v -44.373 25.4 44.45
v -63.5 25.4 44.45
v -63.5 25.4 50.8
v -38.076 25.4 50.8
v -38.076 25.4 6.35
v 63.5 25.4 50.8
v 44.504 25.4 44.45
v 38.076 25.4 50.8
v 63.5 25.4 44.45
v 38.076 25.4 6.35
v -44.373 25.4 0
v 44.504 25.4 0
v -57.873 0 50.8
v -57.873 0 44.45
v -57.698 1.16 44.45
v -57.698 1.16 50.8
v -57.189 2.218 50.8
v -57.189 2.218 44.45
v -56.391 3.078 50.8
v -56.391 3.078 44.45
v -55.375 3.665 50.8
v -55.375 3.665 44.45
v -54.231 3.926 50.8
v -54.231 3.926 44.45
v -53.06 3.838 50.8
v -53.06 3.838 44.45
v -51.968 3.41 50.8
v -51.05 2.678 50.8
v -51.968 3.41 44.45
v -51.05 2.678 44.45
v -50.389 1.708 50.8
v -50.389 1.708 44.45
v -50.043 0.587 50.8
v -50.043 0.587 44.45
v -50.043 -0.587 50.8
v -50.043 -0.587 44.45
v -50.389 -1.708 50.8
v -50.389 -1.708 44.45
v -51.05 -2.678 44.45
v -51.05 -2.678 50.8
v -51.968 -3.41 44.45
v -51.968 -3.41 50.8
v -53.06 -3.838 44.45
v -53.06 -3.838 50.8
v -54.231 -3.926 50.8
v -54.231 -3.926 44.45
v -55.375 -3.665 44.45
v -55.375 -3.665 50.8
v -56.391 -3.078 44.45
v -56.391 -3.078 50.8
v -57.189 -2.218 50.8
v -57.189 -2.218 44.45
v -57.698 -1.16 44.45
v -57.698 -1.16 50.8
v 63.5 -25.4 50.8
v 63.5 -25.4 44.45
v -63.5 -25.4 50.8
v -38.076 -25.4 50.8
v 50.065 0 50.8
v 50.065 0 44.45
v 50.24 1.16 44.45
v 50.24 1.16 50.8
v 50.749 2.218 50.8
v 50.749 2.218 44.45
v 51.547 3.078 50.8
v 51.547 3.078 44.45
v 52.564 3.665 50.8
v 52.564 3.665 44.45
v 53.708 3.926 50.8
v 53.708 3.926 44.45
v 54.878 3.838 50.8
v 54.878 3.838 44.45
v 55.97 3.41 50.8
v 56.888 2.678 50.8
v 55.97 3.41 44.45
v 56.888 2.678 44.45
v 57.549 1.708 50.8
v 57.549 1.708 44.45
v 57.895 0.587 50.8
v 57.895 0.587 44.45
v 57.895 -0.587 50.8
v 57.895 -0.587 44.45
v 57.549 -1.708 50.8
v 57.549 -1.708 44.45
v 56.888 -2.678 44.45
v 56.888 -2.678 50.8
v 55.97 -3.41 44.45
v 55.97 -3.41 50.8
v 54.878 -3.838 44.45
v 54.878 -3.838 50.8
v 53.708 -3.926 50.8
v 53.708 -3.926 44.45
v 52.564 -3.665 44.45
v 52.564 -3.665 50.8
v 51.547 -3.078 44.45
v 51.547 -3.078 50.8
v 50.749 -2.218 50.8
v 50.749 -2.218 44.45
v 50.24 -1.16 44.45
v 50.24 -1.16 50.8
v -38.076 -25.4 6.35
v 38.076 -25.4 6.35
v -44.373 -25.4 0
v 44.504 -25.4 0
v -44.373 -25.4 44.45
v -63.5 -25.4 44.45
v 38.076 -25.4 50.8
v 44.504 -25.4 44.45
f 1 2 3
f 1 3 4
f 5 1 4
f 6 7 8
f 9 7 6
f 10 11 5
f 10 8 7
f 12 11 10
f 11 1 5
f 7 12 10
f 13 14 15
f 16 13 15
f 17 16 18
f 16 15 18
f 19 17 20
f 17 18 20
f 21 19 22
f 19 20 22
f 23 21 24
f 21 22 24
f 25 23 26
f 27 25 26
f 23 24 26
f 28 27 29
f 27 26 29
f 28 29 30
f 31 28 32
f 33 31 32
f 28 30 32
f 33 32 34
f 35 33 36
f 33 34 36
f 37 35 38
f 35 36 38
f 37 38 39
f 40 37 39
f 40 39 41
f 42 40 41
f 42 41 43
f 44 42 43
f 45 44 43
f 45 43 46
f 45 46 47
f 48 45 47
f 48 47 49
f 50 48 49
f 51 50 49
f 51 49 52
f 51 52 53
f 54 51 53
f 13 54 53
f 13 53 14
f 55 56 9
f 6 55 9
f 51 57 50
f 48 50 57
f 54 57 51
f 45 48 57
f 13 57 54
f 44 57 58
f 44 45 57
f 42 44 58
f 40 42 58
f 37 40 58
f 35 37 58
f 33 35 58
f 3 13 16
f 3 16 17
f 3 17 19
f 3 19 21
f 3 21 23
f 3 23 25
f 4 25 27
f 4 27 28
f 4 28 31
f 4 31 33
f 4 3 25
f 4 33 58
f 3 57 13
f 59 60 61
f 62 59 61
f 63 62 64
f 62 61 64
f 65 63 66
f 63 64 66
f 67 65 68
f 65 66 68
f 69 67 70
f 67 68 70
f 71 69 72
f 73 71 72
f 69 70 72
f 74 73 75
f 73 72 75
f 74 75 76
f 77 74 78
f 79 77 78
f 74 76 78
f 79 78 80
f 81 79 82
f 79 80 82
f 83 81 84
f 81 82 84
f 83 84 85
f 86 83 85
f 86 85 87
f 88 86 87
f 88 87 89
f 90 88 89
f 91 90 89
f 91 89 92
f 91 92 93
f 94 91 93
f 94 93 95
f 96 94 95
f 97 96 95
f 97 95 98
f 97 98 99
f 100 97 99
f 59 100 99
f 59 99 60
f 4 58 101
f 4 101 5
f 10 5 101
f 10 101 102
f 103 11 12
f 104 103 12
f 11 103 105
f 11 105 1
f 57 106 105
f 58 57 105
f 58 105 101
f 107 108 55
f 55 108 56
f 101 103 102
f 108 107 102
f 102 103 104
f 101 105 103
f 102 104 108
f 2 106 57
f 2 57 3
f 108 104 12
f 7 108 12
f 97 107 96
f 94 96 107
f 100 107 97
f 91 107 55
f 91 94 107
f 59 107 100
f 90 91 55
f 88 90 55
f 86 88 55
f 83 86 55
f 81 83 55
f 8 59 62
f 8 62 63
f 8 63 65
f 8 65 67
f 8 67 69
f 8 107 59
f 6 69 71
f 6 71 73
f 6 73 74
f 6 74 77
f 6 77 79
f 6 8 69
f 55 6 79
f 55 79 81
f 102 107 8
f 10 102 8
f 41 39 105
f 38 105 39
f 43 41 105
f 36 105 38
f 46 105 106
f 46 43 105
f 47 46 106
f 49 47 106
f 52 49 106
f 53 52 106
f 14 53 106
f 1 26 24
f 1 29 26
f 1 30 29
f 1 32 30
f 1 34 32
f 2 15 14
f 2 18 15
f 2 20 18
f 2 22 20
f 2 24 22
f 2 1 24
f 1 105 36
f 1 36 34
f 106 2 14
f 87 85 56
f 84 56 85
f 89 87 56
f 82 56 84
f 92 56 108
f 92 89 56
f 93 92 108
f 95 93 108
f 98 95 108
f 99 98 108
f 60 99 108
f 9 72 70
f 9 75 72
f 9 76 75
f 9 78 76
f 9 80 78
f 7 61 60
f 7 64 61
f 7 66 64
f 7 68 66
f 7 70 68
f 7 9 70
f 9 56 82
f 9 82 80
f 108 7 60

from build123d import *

# Parameters (mm, degrees)
SKETCH1_W           = 127
SKETCH1_H           = 50.8
BOSS_EXTRUDE1_DEPTH = 50.8
SKETCH2_W           = 18.996127276
SKETCH2_H           = 50.8
SKETCH2_W_2         = 19.127407137
CUT_EXTRUDE1_DEPTH  = 44.45
SKETCH3_W           = 76.151334044
SKETCH3_H           = 50.8
CUT_EXTRUDE2_DEPTH  = 44.45
SKETCH5_R           = 3.937
CUT_EXTRUDE4_DEPTH  = 44.45
SKETCH6_R           = 3.937
CUT_EXTRUDE5_DEPTH  = 44.45


with BuildPart() as part:
    # Sketch1 → Boss-Extrude1 (new body)
    with BuildSketch(Plane.XY):
        Rectangle(SKETCH1_W, SKETCH1_H)
    extrude(amount=BOSS_EXTRUDE1_DEPTH)

    # Sketch2 → Cut-Extrude1 (cut)
    with BuildSketch(Plane(origin=(0, 0, 0), x_dir=(-1, 0, 0), z_dir=(0, 0, -1))):
        with Locations((-54.001936362, 0)):
            Rectangle(SKETCH2_W, SKETCH2_H)
        with Locations((53.936296432, 0)):
            Rectangle(SKETCH2_W_2, SKETCH2_H)
    extrude(amount=-CUT_EXTRUDE1_DEPTH, mode=Mode.SUBTRACT)

    # Sketch3 → Cut-Extrude2 (cut)
    with BuildSketch(Plane.XY.offset(50.8)):
        Rectangle(SKETCH3_W, SKETCH3_H)
    extrude(amount=-CUT_EXTRUDE2_DEPTH, mode=Mode.SUBTRACT)

    # Sketch5 → Cut-Extrude4 (cut)
    with BuildSketch(Plane(origin=(0, 0, 44.45), x_dir=(-1, 0, 0), z_dir=(0, 0, -1))):
        with Locations((-54.001936362, 0)):
            Circle(SKETCH5_R)
    extrude(amount=-CUT_EXTRUDE4_DEPTH, mode=Mode.SUBTRACT)

    # Sketch6 → Cut-Extrude5 (cut)
    with BuildSketch(Plane(origin=(0, 0, 44.45), x_dir=(-1, 0, 0), z_dir=(0, 0, -1))):
        with Locations((53.936296432, 0)):
            Circle(SKETCH6_R)
    extrude(amount=-CUT_EXTRUDE5_DEPTH, mode=Mode.SUBTRACT)


solid = part.part
